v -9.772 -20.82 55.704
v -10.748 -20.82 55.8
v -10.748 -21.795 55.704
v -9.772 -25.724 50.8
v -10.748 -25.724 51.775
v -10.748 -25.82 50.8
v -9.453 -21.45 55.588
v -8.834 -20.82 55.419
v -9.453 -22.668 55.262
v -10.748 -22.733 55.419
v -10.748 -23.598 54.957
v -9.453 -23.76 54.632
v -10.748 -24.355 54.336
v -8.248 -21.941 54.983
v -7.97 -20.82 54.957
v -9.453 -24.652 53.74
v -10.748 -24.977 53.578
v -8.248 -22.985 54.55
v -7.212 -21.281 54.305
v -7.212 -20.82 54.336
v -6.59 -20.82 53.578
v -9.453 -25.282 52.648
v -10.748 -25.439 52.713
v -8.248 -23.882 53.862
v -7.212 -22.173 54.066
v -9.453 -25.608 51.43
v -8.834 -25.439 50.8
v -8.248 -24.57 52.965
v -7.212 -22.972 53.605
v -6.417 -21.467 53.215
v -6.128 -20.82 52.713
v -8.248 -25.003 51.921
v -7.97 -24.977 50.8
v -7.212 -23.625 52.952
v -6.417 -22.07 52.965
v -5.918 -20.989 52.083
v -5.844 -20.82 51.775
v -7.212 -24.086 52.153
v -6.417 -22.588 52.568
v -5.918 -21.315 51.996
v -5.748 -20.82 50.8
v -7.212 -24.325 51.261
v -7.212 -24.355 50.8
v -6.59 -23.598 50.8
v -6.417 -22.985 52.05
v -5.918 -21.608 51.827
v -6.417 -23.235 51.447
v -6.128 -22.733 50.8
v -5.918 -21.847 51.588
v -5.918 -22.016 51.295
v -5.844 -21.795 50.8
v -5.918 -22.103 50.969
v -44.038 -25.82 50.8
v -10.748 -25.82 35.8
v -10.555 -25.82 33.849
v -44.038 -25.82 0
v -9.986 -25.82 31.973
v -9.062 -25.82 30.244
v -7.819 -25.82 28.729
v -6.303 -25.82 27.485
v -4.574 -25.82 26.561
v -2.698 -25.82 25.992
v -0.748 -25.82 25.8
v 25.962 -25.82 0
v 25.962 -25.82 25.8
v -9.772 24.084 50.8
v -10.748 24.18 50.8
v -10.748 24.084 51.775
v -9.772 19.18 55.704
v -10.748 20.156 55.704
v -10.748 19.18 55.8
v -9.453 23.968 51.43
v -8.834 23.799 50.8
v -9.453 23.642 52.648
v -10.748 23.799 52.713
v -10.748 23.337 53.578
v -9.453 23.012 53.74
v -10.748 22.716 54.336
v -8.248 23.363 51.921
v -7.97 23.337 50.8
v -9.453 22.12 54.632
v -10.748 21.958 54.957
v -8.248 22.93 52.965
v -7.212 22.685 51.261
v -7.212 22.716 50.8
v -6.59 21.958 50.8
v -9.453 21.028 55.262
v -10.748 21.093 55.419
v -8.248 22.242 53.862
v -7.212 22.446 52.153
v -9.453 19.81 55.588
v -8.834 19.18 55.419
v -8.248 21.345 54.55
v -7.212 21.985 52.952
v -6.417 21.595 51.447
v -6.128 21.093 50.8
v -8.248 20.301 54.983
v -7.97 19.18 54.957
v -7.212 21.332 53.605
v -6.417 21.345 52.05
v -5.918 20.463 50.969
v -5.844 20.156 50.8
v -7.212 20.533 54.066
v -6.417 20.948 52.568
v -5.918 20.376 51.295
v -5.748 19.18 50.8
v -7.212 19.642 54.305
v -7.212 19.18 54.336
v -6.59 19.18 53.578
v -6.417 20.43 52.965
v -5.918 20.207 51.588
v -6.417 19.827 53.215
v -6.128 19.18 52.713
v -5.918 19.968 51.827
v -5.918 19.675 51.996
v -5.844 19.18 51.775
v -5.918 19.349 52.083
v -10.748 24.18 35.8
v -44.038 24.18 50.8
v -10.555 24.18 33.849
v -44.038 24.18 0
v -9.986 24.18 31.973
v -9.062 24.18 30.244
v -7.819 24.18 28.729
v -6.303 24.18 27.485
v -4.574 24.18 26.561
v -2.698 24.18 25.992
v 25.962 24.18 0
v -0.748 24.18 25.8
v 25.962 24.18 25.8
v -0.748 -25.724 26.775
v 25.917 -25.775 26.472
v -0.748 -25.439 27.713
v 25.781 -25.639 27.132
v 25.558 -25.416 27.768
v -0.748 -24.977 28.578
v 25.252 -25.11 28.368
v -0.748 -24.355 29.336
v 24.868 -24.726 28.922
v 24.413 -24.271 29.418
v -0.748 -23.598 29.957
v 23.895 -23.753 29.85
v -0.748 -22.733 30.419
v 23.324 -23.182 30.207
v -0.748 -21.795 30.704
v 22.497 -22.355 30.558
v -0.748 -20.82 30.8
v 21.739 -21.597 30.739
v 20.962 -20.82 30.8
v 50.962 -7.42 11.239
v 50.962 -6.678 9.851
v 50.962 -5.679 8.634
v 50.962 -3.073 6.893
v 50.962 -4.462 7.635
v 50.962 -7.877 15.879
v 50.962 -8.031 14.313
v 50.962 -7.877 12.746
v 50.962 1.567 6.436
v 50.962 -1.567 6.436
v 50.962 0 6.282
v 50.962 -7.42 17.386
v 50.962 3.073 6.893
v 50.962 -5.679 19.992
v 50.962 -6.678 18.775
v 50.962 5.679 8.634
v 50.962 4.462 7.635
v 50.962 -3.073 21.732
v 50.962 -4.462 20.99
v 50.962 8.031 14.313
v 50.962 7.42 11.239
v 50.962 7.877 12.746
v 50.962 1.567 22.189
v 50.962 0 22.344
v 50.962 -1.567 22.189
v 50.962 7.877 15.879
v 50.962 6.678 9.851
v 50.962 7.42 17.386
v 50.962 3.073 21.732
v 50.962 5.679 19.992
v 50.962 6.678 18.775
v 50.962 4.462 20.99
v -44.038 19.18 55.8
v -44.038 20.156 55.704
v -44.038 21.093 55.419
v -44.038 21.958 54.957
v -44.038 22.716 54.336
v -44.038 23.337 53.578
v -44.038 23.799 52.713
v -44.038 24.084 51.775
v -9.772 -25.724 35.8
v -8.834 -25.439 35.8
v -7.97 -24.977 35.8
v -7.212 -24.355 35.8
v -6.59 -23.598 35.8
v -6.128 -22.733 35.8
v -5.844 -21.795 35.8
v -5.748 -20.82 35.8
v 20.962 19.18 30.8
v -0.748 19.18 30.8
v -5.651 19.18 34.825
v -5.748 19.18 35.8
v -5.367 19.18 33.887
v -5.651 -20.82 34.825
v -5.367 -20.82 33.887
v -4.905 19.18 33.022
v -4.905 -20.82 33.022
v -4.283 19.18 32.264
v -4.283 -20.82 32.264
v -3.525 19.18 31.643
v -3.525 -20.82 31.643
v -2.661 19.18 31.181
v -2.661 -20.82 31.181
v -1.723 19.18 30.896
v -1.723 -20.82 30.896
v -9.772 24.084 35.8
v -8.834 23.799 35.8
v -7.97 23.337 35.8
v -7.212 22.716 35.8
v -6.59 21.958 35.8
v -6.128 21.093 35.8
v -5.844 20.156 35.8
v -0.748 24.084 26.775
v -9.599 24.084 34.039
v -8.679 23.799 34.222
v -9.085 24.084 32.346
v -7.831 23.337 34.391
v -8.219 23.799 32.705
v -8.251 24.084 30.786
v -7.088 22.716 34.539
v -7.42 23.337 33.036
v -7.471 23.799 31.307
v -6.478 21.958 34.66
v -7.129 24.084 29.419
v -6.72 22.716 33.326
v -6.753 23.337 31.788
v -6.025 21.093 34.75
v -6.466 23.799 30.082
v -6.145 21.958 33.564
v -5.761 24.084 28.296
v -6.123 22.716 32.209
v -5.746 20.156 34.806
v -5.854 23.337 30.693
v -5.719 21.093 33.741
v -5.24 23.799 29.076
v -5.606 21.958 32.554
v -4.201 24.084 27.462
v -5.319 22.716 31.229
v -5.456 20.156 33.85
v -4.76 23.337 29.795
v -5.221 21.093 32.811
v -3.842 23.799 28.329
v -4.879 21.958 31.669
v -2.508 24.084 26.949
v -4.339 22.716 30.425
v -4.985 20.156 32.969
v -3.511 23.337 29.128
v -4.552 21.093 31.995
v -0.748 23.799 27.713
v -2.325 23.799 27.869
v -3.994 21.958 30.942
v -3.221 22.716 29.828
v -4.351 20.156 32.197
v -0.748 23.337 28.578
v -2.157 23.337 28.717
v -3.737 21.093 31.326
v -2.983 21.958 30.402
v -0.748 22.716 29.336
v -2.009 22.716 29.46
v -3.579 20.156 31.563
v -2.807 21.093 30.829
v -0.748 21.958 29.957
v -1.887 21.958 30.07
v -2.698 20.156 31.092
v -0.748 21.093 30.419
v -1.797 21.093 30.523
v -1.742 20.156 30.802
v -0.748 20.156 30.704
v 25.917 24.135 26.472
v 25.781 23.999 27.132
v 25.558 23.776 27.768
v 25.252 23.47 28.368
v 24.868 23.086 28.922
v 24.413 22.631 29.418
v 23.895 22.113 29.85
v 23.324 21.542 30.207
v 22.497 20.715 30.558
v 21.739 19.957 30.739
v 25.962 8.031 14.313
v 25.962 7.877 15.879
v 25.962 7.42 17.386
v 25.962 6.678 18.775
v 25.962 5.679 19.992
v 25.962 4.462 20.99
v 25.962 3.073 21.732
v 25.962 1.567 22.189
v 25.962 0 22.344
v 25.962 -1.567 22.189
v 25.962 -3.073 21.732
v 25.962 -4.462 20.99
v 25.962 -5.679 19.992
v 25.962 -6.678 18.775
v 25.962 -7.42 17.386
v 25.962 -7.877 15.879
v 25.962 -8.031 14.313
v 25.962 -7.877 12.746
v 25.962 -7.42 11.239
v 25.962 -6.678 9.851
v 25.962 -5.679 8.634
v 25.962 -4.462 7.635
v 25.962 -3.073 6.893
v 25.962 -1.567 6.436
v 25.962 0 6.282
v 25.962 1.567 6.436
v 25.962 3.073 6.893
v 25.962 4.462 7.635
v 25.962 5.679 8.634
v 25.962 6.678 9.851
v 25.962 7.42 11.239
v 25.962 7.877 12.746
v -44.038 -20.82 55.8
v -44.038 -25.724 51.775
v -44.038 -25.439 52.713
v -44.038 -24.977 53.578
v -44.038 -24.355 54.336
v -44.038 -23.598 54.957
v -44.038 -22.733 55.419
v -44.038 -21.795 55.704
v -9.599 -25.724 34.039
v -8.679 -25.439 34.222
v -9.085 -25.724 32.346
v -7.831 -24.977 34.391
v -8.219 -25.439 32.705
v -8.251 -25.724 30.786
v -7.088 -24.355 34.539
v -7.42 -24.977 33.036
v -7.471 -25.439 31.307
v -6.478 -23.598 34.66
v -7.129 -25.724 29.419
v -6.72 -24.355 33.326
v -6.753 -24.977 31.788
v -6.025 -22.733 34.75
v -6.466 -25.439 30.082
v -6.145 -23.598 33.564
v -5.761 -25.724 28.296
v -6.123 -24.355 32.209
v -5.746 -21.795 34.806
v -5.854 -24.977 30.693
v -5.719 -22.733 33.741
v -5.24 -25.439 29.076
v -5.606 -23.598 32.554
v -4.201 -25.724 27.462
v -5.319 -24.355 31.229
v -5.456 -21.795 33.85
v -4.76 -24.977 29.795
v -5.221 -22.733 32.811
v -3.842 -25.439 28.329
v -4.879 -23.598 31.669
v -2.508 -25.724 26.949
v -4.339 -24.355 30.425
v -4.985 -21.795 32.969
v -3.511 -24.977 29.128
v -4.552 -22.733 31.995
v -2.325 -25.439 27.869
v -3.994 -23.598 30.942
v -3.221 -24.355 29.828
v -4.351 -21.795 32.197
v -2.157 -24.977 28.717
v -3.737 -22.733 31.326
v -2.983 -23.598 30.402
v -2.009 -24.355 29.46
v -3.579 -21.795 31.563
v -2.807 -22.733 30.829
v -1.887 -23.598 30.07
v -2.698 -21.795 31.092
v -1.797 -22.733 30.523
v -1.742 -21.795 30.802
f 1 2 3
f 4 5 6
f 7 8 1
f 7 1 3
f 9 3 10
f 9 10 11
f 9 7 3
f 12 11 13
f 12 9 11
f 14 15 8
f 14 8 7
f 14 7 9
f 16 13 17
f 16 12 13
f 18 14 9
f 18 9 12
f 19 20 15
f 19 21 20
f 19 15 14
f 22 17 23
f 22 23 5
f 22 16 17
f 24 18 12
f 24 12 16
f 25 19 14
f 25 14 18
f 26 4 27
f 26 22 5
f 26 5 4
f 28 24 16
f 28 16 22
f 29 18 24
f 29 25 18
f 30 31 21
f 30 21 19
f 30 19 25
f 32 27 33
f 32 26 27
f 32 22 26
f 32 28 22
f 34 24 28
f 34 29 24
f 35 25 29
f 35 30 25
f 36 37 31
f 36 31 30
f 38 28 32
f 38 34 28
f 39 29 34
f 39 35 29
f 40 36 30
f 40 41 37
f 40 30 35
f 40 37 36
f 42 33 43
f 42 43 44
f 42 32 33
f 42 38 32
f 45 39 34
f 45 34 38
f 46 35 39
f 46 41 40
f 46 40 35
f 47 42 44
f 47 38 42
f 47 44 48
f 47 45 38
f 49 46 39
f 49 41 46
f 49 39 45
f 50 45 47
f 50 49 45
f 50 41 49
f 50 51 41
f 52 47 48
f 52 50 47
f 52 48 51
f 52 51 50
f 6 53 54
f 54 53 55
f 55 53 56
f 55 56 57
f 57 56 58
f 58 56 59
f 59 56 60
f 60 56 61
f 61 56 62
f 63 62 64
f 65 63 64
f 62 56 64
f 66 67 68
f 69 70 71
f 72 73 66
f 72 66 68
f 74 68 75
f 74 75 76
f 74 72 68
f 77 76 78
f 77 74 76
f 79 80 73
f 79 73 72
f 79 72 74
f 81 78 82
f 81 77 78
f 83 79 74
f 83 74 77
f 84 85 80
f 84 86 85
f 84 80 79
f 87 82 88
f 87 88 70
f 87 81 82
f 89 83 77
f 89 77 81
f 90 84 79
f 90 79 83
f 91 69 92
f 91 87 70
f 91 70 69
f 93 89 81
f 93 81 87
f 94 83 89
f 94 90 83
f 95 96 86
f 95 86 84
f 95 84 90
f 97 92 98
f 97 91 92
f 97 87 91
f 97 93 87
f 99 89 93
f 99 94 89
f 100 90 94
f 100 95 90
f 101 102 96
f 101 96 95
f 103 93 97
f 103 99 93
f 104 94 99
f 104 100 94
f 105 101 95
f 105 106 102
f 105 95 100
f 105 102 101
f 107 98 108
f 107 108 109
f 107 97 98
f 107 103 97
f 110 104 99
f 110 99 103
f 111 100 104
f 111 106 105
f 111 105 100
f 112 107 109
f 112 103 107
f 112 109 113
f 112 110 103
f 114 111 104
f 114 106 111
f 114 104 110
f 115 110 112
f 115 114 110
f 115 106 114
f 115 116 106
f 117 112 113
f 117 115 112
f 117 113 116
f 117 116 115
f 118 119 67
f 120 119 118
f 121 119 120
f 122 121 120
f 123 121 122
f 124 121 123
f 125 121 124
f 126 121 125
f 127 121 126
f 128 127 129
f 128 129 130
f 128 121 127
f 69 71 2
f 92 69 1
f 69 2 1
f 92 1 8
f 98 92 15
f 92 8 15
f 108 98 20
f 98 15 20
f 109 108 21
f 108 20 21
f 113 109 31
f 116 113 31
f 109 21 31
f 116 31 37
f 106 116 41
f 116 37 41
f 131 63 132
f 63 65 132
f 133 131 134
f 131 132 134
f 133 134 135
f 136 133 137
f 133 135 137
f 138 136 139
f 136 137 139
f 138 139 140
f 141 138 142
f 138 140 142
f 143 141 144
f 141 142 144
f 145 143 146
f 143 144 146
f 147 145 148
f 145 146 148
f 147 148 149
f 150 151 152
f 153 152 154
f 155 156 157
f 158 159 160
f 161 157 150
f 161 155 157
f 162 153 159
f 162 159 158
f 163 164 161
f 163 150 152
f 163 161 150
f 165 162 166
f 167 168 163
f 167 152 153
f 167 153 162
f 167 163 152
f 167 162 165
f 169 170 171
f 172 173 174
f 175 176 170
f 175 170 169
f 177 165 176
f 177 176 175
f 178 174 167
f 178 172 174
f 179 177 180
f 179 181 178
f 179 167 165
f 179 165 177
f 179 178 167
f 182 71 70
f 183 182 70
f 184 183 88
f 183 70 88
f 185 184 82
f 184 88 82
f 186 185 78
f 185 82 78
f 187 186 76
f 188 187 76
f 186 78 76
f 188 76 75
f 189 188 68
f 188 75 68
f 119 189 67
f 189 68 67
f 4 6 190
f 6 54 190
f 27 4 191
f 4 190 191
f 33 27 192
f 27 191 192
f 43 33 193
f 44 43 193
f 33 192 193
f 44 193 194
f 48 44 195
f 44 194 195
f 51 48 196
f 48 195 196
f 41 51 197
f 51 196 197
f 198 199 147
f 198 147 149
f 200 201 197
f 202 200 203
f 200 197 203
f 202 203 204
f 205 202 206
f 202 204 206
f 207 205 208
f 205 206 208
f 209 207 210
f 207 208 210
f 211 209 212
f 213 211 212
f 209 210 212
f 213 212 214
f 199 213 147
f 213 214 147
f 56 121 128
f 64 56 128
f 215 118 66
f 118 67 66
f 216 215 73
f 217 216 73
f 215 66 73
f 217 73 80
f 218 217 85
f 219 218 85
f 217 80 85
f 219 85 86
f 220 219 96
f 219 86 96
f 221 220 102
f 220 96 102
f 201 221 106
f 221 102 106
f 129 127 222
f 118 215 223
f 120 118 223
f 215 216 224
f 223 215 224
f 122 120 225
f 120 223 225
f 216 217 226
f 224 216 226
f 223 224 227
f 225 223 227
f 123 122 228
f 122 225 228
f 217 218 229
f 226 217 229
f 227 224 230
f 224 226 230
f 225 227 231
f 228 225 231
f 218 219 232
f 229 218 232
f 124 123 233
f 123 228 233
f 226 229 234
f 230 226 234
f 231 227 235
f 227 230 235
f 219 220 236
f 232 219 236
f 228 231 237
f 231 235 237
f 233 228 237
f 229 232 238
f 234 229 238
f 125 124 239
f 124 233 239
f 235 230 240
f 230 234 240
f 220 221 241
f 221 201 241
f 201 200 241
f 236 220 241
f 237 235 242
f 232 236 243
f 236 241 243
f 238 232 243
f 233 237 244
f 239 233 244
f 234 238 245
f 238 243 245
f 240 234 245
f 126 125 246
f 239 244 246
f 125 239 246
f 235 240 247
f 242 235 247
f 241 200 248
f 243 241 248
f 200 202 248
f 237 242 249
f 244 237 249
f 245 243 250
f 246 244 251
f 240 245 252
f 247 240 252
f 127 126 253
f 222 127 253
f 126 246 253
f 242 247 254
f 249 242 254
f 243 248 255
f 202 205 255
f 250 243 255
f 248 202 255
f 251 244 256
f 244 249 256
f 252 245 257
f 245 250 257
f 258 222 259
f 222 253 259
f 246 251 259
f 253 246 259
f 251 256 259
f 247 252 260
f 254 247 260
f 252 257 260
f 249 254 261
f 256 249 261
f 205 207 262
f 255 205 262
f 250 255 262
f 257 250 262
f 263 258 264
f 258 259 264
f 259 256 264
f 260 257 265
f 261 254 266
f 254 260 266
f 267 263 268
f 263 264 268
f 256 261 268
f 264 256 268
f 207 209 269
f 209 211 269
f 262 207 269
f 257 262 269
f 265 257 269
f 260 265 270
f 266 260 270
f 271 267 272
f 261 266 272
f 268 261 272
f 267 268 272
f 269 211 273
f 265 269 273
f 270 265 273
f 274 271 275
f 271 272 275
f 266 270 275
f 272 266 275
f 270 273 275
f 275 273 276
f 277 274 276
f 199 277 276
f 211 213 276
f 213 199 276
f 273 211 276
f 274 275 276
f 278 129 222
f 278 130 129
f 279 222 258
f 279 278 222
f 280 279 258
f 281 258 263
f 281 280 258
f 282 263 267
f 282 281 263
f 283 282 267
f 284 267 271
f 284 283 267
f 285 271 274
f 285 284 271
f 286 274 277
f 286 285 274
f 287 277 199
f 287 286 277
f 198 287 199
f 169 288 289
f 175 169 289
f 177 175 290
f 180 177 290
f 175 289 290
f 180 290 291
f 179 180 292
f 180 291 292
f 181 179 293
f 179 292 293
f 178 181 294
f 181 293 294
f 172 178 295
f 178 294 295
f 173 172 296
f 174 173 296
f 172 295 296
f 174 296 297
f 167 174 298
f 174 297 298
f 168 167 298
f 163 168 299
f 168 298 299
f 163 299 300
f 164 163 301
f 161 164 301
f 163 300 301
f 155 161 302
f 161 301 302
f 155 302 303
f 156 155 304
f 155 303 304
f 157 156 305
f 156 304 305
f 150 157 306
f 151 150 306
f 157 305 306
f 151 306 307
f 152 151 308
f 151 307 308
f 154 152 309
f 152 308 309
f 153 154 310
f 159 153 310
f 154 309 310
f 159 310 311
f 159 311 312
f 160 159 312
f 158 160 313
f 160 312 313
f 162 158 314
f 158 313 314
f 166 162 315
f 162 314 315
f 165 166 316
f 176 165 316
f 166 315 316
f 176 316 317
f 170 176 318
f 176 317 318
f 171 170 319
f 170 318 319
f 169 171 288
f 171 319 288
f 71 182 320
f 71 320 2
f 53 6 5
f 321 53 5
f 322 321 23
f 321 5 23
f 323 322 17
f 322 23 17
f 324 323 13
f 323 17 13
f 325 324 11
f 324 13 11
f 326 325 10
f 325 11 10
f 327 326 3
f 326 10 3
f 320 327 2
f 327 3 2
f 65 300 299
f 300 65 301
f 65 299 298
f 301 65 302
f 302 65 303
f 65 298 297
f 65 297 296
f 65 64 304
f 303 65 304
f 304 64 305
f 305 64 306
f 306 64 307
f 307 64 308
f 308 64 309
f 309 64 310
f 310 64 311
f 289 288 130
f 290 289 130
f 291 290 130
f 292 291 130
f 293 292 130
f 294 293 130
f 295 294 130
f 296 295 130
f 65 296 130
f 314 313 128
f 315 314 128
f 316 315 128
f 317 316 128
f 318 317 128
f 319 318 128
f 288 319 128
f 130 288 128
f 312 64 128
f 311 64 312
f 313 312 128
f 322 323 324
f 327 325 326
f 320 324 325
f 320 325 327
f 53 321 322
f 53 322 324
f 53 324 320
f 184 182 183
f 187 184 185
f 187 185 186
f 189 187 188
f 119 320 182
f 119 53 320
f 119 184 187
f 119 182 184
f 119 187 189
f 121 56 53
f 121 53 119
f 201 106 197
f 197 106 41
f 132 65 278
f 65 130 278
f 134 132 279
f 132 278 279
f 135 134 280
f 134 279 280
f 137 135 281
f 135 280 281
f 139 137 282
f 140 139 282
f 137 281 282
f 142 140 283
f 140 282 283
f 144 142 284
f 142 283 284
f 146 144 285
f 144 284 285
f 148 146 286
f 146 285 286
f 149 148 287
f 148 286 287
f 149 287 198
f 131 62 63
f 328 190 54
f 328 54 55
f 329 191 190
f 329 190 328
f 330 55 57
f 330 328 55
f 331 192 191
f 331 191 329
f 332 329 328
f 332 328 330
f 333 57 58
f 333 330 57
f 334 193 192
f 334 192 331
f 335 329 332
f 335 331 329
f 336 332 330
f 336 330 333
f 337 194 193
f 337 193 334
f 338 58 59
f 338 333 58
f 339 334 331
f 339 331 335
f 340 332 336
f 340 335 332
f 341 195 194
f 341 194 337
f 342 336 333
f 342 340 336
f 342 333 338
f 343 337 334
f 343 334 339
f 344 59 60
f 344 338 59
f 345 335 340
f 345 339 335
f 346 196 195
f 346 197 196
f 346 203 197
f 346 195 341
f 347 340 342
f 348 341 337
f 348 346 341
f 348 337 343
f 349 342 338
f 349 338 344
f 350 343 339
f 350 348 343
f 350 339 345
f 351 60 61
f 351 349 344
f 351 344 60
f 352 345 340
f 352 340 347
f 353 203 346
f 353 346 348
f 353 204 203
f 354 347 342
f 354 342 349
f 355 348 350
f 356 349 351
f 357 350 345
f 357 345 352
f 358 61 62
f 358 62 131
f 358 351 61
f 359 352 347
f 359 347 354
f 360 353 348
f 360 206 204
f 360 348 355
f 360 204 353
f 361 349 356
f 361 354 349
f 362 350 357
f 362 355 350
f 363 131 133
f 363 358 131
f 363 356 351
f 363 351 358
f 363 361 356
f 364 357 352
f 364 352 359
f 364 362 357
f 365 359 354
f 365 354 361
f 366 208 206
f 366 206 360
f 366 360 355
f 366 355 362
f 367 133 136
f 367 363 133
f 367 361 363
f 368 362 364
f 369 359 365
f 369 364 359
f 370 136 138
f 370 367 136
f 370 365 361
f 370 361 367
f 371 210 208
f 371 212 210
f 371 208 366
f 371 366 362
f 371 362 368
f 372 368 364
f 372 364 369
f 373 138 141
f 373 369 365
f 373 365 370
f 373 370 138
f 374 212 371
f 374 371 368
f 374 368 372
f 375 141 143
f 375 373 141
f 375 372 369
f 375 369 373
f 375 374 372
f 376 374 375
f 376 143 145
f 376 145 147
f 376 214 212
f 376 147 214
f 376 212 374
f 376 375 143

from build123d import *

# Parameters (mm, degrees)
F0_W     = 70
F0_H     = 50
F1_DEPTH = 55.8
F2_R     = 5
F3_R     = 5
F4_W     = 31.709628962
F4_H     = 40
F5_DEPTH = 25
F6_R     = 5
F7_R     = 8.0311344771
F8_DEPTH = 25


with BuildPart() as f1:
    # F0 (on Top) → F1 (new body)
    with BuildSketch(Plane.XY):
        with Locations((-9.0379202738, -0.8199248582)):
            Rectangle(F0_W, F0_H)
    extrude(amount=F1_DEPTH)

    # F2
    f2_edges = [f1.edges().sort_by_distance(p)[0] for p in [
        (-9.03792, -25.819925, 55.8),
    ]]
    fillet(f2_edges, radius=F2_R)

    # F3
    f3_edges = [f1.edges().sort_by_distance(p)[0] for p in [
        (-9.03792, 24.180075, 55.8),
    ]]
    fillet(f3_edges, radius=F3_R)

    # F4 (on face) → F5 (cut)
    with BuildSketch(Plane.XY.offset(55.8)):
        Polygon((30.625000596, 31.9975502789), (-5.7475492358, 31.9975502789), (-5.7475492358, 19.1800751418), (25.9620797262, 19.1800751418), (25.9620797262, -20.8199248582), (-5.7475492358, -20.8199248582), (-5.7475492358, -34.0563766658), (30.625000596, -34.0563766658), align=None)
        with Locations((10.1072652452, -0.8199248582)):
            Rectangle(F4_W, F4_H)
    extrude(amount=-F5_DEPTH, mode=Mode.SUBTRACT)

    # F6
    f6_edges = [f1.edges().sort_by_distance(p)[0] for p in [
        (10.107265, 24.180075, 30.8),
        (25.96208, -0.819925, 30.8),
        (10.107265, -25.819925, 30.8),
        (-5.747549, -0.819925, 30.8),
        (-5.747549, -0.819925, 55.8),
        (-5.747549, 22.715609, 54.335534),
        (-5.747549, -24.355459, 54.335534),
    ]]
    fillet(f6_edges, radius=F6_R)

    # F7 (on face) → F8 (join)
    with BuildSketch(Plane.YZ.offset(25.9620797262)):
        with Locations((0, 14.312678948)):
            Circle(F7_R)
    extrude(amount=F8_DEPTH)


solid = f1.part
